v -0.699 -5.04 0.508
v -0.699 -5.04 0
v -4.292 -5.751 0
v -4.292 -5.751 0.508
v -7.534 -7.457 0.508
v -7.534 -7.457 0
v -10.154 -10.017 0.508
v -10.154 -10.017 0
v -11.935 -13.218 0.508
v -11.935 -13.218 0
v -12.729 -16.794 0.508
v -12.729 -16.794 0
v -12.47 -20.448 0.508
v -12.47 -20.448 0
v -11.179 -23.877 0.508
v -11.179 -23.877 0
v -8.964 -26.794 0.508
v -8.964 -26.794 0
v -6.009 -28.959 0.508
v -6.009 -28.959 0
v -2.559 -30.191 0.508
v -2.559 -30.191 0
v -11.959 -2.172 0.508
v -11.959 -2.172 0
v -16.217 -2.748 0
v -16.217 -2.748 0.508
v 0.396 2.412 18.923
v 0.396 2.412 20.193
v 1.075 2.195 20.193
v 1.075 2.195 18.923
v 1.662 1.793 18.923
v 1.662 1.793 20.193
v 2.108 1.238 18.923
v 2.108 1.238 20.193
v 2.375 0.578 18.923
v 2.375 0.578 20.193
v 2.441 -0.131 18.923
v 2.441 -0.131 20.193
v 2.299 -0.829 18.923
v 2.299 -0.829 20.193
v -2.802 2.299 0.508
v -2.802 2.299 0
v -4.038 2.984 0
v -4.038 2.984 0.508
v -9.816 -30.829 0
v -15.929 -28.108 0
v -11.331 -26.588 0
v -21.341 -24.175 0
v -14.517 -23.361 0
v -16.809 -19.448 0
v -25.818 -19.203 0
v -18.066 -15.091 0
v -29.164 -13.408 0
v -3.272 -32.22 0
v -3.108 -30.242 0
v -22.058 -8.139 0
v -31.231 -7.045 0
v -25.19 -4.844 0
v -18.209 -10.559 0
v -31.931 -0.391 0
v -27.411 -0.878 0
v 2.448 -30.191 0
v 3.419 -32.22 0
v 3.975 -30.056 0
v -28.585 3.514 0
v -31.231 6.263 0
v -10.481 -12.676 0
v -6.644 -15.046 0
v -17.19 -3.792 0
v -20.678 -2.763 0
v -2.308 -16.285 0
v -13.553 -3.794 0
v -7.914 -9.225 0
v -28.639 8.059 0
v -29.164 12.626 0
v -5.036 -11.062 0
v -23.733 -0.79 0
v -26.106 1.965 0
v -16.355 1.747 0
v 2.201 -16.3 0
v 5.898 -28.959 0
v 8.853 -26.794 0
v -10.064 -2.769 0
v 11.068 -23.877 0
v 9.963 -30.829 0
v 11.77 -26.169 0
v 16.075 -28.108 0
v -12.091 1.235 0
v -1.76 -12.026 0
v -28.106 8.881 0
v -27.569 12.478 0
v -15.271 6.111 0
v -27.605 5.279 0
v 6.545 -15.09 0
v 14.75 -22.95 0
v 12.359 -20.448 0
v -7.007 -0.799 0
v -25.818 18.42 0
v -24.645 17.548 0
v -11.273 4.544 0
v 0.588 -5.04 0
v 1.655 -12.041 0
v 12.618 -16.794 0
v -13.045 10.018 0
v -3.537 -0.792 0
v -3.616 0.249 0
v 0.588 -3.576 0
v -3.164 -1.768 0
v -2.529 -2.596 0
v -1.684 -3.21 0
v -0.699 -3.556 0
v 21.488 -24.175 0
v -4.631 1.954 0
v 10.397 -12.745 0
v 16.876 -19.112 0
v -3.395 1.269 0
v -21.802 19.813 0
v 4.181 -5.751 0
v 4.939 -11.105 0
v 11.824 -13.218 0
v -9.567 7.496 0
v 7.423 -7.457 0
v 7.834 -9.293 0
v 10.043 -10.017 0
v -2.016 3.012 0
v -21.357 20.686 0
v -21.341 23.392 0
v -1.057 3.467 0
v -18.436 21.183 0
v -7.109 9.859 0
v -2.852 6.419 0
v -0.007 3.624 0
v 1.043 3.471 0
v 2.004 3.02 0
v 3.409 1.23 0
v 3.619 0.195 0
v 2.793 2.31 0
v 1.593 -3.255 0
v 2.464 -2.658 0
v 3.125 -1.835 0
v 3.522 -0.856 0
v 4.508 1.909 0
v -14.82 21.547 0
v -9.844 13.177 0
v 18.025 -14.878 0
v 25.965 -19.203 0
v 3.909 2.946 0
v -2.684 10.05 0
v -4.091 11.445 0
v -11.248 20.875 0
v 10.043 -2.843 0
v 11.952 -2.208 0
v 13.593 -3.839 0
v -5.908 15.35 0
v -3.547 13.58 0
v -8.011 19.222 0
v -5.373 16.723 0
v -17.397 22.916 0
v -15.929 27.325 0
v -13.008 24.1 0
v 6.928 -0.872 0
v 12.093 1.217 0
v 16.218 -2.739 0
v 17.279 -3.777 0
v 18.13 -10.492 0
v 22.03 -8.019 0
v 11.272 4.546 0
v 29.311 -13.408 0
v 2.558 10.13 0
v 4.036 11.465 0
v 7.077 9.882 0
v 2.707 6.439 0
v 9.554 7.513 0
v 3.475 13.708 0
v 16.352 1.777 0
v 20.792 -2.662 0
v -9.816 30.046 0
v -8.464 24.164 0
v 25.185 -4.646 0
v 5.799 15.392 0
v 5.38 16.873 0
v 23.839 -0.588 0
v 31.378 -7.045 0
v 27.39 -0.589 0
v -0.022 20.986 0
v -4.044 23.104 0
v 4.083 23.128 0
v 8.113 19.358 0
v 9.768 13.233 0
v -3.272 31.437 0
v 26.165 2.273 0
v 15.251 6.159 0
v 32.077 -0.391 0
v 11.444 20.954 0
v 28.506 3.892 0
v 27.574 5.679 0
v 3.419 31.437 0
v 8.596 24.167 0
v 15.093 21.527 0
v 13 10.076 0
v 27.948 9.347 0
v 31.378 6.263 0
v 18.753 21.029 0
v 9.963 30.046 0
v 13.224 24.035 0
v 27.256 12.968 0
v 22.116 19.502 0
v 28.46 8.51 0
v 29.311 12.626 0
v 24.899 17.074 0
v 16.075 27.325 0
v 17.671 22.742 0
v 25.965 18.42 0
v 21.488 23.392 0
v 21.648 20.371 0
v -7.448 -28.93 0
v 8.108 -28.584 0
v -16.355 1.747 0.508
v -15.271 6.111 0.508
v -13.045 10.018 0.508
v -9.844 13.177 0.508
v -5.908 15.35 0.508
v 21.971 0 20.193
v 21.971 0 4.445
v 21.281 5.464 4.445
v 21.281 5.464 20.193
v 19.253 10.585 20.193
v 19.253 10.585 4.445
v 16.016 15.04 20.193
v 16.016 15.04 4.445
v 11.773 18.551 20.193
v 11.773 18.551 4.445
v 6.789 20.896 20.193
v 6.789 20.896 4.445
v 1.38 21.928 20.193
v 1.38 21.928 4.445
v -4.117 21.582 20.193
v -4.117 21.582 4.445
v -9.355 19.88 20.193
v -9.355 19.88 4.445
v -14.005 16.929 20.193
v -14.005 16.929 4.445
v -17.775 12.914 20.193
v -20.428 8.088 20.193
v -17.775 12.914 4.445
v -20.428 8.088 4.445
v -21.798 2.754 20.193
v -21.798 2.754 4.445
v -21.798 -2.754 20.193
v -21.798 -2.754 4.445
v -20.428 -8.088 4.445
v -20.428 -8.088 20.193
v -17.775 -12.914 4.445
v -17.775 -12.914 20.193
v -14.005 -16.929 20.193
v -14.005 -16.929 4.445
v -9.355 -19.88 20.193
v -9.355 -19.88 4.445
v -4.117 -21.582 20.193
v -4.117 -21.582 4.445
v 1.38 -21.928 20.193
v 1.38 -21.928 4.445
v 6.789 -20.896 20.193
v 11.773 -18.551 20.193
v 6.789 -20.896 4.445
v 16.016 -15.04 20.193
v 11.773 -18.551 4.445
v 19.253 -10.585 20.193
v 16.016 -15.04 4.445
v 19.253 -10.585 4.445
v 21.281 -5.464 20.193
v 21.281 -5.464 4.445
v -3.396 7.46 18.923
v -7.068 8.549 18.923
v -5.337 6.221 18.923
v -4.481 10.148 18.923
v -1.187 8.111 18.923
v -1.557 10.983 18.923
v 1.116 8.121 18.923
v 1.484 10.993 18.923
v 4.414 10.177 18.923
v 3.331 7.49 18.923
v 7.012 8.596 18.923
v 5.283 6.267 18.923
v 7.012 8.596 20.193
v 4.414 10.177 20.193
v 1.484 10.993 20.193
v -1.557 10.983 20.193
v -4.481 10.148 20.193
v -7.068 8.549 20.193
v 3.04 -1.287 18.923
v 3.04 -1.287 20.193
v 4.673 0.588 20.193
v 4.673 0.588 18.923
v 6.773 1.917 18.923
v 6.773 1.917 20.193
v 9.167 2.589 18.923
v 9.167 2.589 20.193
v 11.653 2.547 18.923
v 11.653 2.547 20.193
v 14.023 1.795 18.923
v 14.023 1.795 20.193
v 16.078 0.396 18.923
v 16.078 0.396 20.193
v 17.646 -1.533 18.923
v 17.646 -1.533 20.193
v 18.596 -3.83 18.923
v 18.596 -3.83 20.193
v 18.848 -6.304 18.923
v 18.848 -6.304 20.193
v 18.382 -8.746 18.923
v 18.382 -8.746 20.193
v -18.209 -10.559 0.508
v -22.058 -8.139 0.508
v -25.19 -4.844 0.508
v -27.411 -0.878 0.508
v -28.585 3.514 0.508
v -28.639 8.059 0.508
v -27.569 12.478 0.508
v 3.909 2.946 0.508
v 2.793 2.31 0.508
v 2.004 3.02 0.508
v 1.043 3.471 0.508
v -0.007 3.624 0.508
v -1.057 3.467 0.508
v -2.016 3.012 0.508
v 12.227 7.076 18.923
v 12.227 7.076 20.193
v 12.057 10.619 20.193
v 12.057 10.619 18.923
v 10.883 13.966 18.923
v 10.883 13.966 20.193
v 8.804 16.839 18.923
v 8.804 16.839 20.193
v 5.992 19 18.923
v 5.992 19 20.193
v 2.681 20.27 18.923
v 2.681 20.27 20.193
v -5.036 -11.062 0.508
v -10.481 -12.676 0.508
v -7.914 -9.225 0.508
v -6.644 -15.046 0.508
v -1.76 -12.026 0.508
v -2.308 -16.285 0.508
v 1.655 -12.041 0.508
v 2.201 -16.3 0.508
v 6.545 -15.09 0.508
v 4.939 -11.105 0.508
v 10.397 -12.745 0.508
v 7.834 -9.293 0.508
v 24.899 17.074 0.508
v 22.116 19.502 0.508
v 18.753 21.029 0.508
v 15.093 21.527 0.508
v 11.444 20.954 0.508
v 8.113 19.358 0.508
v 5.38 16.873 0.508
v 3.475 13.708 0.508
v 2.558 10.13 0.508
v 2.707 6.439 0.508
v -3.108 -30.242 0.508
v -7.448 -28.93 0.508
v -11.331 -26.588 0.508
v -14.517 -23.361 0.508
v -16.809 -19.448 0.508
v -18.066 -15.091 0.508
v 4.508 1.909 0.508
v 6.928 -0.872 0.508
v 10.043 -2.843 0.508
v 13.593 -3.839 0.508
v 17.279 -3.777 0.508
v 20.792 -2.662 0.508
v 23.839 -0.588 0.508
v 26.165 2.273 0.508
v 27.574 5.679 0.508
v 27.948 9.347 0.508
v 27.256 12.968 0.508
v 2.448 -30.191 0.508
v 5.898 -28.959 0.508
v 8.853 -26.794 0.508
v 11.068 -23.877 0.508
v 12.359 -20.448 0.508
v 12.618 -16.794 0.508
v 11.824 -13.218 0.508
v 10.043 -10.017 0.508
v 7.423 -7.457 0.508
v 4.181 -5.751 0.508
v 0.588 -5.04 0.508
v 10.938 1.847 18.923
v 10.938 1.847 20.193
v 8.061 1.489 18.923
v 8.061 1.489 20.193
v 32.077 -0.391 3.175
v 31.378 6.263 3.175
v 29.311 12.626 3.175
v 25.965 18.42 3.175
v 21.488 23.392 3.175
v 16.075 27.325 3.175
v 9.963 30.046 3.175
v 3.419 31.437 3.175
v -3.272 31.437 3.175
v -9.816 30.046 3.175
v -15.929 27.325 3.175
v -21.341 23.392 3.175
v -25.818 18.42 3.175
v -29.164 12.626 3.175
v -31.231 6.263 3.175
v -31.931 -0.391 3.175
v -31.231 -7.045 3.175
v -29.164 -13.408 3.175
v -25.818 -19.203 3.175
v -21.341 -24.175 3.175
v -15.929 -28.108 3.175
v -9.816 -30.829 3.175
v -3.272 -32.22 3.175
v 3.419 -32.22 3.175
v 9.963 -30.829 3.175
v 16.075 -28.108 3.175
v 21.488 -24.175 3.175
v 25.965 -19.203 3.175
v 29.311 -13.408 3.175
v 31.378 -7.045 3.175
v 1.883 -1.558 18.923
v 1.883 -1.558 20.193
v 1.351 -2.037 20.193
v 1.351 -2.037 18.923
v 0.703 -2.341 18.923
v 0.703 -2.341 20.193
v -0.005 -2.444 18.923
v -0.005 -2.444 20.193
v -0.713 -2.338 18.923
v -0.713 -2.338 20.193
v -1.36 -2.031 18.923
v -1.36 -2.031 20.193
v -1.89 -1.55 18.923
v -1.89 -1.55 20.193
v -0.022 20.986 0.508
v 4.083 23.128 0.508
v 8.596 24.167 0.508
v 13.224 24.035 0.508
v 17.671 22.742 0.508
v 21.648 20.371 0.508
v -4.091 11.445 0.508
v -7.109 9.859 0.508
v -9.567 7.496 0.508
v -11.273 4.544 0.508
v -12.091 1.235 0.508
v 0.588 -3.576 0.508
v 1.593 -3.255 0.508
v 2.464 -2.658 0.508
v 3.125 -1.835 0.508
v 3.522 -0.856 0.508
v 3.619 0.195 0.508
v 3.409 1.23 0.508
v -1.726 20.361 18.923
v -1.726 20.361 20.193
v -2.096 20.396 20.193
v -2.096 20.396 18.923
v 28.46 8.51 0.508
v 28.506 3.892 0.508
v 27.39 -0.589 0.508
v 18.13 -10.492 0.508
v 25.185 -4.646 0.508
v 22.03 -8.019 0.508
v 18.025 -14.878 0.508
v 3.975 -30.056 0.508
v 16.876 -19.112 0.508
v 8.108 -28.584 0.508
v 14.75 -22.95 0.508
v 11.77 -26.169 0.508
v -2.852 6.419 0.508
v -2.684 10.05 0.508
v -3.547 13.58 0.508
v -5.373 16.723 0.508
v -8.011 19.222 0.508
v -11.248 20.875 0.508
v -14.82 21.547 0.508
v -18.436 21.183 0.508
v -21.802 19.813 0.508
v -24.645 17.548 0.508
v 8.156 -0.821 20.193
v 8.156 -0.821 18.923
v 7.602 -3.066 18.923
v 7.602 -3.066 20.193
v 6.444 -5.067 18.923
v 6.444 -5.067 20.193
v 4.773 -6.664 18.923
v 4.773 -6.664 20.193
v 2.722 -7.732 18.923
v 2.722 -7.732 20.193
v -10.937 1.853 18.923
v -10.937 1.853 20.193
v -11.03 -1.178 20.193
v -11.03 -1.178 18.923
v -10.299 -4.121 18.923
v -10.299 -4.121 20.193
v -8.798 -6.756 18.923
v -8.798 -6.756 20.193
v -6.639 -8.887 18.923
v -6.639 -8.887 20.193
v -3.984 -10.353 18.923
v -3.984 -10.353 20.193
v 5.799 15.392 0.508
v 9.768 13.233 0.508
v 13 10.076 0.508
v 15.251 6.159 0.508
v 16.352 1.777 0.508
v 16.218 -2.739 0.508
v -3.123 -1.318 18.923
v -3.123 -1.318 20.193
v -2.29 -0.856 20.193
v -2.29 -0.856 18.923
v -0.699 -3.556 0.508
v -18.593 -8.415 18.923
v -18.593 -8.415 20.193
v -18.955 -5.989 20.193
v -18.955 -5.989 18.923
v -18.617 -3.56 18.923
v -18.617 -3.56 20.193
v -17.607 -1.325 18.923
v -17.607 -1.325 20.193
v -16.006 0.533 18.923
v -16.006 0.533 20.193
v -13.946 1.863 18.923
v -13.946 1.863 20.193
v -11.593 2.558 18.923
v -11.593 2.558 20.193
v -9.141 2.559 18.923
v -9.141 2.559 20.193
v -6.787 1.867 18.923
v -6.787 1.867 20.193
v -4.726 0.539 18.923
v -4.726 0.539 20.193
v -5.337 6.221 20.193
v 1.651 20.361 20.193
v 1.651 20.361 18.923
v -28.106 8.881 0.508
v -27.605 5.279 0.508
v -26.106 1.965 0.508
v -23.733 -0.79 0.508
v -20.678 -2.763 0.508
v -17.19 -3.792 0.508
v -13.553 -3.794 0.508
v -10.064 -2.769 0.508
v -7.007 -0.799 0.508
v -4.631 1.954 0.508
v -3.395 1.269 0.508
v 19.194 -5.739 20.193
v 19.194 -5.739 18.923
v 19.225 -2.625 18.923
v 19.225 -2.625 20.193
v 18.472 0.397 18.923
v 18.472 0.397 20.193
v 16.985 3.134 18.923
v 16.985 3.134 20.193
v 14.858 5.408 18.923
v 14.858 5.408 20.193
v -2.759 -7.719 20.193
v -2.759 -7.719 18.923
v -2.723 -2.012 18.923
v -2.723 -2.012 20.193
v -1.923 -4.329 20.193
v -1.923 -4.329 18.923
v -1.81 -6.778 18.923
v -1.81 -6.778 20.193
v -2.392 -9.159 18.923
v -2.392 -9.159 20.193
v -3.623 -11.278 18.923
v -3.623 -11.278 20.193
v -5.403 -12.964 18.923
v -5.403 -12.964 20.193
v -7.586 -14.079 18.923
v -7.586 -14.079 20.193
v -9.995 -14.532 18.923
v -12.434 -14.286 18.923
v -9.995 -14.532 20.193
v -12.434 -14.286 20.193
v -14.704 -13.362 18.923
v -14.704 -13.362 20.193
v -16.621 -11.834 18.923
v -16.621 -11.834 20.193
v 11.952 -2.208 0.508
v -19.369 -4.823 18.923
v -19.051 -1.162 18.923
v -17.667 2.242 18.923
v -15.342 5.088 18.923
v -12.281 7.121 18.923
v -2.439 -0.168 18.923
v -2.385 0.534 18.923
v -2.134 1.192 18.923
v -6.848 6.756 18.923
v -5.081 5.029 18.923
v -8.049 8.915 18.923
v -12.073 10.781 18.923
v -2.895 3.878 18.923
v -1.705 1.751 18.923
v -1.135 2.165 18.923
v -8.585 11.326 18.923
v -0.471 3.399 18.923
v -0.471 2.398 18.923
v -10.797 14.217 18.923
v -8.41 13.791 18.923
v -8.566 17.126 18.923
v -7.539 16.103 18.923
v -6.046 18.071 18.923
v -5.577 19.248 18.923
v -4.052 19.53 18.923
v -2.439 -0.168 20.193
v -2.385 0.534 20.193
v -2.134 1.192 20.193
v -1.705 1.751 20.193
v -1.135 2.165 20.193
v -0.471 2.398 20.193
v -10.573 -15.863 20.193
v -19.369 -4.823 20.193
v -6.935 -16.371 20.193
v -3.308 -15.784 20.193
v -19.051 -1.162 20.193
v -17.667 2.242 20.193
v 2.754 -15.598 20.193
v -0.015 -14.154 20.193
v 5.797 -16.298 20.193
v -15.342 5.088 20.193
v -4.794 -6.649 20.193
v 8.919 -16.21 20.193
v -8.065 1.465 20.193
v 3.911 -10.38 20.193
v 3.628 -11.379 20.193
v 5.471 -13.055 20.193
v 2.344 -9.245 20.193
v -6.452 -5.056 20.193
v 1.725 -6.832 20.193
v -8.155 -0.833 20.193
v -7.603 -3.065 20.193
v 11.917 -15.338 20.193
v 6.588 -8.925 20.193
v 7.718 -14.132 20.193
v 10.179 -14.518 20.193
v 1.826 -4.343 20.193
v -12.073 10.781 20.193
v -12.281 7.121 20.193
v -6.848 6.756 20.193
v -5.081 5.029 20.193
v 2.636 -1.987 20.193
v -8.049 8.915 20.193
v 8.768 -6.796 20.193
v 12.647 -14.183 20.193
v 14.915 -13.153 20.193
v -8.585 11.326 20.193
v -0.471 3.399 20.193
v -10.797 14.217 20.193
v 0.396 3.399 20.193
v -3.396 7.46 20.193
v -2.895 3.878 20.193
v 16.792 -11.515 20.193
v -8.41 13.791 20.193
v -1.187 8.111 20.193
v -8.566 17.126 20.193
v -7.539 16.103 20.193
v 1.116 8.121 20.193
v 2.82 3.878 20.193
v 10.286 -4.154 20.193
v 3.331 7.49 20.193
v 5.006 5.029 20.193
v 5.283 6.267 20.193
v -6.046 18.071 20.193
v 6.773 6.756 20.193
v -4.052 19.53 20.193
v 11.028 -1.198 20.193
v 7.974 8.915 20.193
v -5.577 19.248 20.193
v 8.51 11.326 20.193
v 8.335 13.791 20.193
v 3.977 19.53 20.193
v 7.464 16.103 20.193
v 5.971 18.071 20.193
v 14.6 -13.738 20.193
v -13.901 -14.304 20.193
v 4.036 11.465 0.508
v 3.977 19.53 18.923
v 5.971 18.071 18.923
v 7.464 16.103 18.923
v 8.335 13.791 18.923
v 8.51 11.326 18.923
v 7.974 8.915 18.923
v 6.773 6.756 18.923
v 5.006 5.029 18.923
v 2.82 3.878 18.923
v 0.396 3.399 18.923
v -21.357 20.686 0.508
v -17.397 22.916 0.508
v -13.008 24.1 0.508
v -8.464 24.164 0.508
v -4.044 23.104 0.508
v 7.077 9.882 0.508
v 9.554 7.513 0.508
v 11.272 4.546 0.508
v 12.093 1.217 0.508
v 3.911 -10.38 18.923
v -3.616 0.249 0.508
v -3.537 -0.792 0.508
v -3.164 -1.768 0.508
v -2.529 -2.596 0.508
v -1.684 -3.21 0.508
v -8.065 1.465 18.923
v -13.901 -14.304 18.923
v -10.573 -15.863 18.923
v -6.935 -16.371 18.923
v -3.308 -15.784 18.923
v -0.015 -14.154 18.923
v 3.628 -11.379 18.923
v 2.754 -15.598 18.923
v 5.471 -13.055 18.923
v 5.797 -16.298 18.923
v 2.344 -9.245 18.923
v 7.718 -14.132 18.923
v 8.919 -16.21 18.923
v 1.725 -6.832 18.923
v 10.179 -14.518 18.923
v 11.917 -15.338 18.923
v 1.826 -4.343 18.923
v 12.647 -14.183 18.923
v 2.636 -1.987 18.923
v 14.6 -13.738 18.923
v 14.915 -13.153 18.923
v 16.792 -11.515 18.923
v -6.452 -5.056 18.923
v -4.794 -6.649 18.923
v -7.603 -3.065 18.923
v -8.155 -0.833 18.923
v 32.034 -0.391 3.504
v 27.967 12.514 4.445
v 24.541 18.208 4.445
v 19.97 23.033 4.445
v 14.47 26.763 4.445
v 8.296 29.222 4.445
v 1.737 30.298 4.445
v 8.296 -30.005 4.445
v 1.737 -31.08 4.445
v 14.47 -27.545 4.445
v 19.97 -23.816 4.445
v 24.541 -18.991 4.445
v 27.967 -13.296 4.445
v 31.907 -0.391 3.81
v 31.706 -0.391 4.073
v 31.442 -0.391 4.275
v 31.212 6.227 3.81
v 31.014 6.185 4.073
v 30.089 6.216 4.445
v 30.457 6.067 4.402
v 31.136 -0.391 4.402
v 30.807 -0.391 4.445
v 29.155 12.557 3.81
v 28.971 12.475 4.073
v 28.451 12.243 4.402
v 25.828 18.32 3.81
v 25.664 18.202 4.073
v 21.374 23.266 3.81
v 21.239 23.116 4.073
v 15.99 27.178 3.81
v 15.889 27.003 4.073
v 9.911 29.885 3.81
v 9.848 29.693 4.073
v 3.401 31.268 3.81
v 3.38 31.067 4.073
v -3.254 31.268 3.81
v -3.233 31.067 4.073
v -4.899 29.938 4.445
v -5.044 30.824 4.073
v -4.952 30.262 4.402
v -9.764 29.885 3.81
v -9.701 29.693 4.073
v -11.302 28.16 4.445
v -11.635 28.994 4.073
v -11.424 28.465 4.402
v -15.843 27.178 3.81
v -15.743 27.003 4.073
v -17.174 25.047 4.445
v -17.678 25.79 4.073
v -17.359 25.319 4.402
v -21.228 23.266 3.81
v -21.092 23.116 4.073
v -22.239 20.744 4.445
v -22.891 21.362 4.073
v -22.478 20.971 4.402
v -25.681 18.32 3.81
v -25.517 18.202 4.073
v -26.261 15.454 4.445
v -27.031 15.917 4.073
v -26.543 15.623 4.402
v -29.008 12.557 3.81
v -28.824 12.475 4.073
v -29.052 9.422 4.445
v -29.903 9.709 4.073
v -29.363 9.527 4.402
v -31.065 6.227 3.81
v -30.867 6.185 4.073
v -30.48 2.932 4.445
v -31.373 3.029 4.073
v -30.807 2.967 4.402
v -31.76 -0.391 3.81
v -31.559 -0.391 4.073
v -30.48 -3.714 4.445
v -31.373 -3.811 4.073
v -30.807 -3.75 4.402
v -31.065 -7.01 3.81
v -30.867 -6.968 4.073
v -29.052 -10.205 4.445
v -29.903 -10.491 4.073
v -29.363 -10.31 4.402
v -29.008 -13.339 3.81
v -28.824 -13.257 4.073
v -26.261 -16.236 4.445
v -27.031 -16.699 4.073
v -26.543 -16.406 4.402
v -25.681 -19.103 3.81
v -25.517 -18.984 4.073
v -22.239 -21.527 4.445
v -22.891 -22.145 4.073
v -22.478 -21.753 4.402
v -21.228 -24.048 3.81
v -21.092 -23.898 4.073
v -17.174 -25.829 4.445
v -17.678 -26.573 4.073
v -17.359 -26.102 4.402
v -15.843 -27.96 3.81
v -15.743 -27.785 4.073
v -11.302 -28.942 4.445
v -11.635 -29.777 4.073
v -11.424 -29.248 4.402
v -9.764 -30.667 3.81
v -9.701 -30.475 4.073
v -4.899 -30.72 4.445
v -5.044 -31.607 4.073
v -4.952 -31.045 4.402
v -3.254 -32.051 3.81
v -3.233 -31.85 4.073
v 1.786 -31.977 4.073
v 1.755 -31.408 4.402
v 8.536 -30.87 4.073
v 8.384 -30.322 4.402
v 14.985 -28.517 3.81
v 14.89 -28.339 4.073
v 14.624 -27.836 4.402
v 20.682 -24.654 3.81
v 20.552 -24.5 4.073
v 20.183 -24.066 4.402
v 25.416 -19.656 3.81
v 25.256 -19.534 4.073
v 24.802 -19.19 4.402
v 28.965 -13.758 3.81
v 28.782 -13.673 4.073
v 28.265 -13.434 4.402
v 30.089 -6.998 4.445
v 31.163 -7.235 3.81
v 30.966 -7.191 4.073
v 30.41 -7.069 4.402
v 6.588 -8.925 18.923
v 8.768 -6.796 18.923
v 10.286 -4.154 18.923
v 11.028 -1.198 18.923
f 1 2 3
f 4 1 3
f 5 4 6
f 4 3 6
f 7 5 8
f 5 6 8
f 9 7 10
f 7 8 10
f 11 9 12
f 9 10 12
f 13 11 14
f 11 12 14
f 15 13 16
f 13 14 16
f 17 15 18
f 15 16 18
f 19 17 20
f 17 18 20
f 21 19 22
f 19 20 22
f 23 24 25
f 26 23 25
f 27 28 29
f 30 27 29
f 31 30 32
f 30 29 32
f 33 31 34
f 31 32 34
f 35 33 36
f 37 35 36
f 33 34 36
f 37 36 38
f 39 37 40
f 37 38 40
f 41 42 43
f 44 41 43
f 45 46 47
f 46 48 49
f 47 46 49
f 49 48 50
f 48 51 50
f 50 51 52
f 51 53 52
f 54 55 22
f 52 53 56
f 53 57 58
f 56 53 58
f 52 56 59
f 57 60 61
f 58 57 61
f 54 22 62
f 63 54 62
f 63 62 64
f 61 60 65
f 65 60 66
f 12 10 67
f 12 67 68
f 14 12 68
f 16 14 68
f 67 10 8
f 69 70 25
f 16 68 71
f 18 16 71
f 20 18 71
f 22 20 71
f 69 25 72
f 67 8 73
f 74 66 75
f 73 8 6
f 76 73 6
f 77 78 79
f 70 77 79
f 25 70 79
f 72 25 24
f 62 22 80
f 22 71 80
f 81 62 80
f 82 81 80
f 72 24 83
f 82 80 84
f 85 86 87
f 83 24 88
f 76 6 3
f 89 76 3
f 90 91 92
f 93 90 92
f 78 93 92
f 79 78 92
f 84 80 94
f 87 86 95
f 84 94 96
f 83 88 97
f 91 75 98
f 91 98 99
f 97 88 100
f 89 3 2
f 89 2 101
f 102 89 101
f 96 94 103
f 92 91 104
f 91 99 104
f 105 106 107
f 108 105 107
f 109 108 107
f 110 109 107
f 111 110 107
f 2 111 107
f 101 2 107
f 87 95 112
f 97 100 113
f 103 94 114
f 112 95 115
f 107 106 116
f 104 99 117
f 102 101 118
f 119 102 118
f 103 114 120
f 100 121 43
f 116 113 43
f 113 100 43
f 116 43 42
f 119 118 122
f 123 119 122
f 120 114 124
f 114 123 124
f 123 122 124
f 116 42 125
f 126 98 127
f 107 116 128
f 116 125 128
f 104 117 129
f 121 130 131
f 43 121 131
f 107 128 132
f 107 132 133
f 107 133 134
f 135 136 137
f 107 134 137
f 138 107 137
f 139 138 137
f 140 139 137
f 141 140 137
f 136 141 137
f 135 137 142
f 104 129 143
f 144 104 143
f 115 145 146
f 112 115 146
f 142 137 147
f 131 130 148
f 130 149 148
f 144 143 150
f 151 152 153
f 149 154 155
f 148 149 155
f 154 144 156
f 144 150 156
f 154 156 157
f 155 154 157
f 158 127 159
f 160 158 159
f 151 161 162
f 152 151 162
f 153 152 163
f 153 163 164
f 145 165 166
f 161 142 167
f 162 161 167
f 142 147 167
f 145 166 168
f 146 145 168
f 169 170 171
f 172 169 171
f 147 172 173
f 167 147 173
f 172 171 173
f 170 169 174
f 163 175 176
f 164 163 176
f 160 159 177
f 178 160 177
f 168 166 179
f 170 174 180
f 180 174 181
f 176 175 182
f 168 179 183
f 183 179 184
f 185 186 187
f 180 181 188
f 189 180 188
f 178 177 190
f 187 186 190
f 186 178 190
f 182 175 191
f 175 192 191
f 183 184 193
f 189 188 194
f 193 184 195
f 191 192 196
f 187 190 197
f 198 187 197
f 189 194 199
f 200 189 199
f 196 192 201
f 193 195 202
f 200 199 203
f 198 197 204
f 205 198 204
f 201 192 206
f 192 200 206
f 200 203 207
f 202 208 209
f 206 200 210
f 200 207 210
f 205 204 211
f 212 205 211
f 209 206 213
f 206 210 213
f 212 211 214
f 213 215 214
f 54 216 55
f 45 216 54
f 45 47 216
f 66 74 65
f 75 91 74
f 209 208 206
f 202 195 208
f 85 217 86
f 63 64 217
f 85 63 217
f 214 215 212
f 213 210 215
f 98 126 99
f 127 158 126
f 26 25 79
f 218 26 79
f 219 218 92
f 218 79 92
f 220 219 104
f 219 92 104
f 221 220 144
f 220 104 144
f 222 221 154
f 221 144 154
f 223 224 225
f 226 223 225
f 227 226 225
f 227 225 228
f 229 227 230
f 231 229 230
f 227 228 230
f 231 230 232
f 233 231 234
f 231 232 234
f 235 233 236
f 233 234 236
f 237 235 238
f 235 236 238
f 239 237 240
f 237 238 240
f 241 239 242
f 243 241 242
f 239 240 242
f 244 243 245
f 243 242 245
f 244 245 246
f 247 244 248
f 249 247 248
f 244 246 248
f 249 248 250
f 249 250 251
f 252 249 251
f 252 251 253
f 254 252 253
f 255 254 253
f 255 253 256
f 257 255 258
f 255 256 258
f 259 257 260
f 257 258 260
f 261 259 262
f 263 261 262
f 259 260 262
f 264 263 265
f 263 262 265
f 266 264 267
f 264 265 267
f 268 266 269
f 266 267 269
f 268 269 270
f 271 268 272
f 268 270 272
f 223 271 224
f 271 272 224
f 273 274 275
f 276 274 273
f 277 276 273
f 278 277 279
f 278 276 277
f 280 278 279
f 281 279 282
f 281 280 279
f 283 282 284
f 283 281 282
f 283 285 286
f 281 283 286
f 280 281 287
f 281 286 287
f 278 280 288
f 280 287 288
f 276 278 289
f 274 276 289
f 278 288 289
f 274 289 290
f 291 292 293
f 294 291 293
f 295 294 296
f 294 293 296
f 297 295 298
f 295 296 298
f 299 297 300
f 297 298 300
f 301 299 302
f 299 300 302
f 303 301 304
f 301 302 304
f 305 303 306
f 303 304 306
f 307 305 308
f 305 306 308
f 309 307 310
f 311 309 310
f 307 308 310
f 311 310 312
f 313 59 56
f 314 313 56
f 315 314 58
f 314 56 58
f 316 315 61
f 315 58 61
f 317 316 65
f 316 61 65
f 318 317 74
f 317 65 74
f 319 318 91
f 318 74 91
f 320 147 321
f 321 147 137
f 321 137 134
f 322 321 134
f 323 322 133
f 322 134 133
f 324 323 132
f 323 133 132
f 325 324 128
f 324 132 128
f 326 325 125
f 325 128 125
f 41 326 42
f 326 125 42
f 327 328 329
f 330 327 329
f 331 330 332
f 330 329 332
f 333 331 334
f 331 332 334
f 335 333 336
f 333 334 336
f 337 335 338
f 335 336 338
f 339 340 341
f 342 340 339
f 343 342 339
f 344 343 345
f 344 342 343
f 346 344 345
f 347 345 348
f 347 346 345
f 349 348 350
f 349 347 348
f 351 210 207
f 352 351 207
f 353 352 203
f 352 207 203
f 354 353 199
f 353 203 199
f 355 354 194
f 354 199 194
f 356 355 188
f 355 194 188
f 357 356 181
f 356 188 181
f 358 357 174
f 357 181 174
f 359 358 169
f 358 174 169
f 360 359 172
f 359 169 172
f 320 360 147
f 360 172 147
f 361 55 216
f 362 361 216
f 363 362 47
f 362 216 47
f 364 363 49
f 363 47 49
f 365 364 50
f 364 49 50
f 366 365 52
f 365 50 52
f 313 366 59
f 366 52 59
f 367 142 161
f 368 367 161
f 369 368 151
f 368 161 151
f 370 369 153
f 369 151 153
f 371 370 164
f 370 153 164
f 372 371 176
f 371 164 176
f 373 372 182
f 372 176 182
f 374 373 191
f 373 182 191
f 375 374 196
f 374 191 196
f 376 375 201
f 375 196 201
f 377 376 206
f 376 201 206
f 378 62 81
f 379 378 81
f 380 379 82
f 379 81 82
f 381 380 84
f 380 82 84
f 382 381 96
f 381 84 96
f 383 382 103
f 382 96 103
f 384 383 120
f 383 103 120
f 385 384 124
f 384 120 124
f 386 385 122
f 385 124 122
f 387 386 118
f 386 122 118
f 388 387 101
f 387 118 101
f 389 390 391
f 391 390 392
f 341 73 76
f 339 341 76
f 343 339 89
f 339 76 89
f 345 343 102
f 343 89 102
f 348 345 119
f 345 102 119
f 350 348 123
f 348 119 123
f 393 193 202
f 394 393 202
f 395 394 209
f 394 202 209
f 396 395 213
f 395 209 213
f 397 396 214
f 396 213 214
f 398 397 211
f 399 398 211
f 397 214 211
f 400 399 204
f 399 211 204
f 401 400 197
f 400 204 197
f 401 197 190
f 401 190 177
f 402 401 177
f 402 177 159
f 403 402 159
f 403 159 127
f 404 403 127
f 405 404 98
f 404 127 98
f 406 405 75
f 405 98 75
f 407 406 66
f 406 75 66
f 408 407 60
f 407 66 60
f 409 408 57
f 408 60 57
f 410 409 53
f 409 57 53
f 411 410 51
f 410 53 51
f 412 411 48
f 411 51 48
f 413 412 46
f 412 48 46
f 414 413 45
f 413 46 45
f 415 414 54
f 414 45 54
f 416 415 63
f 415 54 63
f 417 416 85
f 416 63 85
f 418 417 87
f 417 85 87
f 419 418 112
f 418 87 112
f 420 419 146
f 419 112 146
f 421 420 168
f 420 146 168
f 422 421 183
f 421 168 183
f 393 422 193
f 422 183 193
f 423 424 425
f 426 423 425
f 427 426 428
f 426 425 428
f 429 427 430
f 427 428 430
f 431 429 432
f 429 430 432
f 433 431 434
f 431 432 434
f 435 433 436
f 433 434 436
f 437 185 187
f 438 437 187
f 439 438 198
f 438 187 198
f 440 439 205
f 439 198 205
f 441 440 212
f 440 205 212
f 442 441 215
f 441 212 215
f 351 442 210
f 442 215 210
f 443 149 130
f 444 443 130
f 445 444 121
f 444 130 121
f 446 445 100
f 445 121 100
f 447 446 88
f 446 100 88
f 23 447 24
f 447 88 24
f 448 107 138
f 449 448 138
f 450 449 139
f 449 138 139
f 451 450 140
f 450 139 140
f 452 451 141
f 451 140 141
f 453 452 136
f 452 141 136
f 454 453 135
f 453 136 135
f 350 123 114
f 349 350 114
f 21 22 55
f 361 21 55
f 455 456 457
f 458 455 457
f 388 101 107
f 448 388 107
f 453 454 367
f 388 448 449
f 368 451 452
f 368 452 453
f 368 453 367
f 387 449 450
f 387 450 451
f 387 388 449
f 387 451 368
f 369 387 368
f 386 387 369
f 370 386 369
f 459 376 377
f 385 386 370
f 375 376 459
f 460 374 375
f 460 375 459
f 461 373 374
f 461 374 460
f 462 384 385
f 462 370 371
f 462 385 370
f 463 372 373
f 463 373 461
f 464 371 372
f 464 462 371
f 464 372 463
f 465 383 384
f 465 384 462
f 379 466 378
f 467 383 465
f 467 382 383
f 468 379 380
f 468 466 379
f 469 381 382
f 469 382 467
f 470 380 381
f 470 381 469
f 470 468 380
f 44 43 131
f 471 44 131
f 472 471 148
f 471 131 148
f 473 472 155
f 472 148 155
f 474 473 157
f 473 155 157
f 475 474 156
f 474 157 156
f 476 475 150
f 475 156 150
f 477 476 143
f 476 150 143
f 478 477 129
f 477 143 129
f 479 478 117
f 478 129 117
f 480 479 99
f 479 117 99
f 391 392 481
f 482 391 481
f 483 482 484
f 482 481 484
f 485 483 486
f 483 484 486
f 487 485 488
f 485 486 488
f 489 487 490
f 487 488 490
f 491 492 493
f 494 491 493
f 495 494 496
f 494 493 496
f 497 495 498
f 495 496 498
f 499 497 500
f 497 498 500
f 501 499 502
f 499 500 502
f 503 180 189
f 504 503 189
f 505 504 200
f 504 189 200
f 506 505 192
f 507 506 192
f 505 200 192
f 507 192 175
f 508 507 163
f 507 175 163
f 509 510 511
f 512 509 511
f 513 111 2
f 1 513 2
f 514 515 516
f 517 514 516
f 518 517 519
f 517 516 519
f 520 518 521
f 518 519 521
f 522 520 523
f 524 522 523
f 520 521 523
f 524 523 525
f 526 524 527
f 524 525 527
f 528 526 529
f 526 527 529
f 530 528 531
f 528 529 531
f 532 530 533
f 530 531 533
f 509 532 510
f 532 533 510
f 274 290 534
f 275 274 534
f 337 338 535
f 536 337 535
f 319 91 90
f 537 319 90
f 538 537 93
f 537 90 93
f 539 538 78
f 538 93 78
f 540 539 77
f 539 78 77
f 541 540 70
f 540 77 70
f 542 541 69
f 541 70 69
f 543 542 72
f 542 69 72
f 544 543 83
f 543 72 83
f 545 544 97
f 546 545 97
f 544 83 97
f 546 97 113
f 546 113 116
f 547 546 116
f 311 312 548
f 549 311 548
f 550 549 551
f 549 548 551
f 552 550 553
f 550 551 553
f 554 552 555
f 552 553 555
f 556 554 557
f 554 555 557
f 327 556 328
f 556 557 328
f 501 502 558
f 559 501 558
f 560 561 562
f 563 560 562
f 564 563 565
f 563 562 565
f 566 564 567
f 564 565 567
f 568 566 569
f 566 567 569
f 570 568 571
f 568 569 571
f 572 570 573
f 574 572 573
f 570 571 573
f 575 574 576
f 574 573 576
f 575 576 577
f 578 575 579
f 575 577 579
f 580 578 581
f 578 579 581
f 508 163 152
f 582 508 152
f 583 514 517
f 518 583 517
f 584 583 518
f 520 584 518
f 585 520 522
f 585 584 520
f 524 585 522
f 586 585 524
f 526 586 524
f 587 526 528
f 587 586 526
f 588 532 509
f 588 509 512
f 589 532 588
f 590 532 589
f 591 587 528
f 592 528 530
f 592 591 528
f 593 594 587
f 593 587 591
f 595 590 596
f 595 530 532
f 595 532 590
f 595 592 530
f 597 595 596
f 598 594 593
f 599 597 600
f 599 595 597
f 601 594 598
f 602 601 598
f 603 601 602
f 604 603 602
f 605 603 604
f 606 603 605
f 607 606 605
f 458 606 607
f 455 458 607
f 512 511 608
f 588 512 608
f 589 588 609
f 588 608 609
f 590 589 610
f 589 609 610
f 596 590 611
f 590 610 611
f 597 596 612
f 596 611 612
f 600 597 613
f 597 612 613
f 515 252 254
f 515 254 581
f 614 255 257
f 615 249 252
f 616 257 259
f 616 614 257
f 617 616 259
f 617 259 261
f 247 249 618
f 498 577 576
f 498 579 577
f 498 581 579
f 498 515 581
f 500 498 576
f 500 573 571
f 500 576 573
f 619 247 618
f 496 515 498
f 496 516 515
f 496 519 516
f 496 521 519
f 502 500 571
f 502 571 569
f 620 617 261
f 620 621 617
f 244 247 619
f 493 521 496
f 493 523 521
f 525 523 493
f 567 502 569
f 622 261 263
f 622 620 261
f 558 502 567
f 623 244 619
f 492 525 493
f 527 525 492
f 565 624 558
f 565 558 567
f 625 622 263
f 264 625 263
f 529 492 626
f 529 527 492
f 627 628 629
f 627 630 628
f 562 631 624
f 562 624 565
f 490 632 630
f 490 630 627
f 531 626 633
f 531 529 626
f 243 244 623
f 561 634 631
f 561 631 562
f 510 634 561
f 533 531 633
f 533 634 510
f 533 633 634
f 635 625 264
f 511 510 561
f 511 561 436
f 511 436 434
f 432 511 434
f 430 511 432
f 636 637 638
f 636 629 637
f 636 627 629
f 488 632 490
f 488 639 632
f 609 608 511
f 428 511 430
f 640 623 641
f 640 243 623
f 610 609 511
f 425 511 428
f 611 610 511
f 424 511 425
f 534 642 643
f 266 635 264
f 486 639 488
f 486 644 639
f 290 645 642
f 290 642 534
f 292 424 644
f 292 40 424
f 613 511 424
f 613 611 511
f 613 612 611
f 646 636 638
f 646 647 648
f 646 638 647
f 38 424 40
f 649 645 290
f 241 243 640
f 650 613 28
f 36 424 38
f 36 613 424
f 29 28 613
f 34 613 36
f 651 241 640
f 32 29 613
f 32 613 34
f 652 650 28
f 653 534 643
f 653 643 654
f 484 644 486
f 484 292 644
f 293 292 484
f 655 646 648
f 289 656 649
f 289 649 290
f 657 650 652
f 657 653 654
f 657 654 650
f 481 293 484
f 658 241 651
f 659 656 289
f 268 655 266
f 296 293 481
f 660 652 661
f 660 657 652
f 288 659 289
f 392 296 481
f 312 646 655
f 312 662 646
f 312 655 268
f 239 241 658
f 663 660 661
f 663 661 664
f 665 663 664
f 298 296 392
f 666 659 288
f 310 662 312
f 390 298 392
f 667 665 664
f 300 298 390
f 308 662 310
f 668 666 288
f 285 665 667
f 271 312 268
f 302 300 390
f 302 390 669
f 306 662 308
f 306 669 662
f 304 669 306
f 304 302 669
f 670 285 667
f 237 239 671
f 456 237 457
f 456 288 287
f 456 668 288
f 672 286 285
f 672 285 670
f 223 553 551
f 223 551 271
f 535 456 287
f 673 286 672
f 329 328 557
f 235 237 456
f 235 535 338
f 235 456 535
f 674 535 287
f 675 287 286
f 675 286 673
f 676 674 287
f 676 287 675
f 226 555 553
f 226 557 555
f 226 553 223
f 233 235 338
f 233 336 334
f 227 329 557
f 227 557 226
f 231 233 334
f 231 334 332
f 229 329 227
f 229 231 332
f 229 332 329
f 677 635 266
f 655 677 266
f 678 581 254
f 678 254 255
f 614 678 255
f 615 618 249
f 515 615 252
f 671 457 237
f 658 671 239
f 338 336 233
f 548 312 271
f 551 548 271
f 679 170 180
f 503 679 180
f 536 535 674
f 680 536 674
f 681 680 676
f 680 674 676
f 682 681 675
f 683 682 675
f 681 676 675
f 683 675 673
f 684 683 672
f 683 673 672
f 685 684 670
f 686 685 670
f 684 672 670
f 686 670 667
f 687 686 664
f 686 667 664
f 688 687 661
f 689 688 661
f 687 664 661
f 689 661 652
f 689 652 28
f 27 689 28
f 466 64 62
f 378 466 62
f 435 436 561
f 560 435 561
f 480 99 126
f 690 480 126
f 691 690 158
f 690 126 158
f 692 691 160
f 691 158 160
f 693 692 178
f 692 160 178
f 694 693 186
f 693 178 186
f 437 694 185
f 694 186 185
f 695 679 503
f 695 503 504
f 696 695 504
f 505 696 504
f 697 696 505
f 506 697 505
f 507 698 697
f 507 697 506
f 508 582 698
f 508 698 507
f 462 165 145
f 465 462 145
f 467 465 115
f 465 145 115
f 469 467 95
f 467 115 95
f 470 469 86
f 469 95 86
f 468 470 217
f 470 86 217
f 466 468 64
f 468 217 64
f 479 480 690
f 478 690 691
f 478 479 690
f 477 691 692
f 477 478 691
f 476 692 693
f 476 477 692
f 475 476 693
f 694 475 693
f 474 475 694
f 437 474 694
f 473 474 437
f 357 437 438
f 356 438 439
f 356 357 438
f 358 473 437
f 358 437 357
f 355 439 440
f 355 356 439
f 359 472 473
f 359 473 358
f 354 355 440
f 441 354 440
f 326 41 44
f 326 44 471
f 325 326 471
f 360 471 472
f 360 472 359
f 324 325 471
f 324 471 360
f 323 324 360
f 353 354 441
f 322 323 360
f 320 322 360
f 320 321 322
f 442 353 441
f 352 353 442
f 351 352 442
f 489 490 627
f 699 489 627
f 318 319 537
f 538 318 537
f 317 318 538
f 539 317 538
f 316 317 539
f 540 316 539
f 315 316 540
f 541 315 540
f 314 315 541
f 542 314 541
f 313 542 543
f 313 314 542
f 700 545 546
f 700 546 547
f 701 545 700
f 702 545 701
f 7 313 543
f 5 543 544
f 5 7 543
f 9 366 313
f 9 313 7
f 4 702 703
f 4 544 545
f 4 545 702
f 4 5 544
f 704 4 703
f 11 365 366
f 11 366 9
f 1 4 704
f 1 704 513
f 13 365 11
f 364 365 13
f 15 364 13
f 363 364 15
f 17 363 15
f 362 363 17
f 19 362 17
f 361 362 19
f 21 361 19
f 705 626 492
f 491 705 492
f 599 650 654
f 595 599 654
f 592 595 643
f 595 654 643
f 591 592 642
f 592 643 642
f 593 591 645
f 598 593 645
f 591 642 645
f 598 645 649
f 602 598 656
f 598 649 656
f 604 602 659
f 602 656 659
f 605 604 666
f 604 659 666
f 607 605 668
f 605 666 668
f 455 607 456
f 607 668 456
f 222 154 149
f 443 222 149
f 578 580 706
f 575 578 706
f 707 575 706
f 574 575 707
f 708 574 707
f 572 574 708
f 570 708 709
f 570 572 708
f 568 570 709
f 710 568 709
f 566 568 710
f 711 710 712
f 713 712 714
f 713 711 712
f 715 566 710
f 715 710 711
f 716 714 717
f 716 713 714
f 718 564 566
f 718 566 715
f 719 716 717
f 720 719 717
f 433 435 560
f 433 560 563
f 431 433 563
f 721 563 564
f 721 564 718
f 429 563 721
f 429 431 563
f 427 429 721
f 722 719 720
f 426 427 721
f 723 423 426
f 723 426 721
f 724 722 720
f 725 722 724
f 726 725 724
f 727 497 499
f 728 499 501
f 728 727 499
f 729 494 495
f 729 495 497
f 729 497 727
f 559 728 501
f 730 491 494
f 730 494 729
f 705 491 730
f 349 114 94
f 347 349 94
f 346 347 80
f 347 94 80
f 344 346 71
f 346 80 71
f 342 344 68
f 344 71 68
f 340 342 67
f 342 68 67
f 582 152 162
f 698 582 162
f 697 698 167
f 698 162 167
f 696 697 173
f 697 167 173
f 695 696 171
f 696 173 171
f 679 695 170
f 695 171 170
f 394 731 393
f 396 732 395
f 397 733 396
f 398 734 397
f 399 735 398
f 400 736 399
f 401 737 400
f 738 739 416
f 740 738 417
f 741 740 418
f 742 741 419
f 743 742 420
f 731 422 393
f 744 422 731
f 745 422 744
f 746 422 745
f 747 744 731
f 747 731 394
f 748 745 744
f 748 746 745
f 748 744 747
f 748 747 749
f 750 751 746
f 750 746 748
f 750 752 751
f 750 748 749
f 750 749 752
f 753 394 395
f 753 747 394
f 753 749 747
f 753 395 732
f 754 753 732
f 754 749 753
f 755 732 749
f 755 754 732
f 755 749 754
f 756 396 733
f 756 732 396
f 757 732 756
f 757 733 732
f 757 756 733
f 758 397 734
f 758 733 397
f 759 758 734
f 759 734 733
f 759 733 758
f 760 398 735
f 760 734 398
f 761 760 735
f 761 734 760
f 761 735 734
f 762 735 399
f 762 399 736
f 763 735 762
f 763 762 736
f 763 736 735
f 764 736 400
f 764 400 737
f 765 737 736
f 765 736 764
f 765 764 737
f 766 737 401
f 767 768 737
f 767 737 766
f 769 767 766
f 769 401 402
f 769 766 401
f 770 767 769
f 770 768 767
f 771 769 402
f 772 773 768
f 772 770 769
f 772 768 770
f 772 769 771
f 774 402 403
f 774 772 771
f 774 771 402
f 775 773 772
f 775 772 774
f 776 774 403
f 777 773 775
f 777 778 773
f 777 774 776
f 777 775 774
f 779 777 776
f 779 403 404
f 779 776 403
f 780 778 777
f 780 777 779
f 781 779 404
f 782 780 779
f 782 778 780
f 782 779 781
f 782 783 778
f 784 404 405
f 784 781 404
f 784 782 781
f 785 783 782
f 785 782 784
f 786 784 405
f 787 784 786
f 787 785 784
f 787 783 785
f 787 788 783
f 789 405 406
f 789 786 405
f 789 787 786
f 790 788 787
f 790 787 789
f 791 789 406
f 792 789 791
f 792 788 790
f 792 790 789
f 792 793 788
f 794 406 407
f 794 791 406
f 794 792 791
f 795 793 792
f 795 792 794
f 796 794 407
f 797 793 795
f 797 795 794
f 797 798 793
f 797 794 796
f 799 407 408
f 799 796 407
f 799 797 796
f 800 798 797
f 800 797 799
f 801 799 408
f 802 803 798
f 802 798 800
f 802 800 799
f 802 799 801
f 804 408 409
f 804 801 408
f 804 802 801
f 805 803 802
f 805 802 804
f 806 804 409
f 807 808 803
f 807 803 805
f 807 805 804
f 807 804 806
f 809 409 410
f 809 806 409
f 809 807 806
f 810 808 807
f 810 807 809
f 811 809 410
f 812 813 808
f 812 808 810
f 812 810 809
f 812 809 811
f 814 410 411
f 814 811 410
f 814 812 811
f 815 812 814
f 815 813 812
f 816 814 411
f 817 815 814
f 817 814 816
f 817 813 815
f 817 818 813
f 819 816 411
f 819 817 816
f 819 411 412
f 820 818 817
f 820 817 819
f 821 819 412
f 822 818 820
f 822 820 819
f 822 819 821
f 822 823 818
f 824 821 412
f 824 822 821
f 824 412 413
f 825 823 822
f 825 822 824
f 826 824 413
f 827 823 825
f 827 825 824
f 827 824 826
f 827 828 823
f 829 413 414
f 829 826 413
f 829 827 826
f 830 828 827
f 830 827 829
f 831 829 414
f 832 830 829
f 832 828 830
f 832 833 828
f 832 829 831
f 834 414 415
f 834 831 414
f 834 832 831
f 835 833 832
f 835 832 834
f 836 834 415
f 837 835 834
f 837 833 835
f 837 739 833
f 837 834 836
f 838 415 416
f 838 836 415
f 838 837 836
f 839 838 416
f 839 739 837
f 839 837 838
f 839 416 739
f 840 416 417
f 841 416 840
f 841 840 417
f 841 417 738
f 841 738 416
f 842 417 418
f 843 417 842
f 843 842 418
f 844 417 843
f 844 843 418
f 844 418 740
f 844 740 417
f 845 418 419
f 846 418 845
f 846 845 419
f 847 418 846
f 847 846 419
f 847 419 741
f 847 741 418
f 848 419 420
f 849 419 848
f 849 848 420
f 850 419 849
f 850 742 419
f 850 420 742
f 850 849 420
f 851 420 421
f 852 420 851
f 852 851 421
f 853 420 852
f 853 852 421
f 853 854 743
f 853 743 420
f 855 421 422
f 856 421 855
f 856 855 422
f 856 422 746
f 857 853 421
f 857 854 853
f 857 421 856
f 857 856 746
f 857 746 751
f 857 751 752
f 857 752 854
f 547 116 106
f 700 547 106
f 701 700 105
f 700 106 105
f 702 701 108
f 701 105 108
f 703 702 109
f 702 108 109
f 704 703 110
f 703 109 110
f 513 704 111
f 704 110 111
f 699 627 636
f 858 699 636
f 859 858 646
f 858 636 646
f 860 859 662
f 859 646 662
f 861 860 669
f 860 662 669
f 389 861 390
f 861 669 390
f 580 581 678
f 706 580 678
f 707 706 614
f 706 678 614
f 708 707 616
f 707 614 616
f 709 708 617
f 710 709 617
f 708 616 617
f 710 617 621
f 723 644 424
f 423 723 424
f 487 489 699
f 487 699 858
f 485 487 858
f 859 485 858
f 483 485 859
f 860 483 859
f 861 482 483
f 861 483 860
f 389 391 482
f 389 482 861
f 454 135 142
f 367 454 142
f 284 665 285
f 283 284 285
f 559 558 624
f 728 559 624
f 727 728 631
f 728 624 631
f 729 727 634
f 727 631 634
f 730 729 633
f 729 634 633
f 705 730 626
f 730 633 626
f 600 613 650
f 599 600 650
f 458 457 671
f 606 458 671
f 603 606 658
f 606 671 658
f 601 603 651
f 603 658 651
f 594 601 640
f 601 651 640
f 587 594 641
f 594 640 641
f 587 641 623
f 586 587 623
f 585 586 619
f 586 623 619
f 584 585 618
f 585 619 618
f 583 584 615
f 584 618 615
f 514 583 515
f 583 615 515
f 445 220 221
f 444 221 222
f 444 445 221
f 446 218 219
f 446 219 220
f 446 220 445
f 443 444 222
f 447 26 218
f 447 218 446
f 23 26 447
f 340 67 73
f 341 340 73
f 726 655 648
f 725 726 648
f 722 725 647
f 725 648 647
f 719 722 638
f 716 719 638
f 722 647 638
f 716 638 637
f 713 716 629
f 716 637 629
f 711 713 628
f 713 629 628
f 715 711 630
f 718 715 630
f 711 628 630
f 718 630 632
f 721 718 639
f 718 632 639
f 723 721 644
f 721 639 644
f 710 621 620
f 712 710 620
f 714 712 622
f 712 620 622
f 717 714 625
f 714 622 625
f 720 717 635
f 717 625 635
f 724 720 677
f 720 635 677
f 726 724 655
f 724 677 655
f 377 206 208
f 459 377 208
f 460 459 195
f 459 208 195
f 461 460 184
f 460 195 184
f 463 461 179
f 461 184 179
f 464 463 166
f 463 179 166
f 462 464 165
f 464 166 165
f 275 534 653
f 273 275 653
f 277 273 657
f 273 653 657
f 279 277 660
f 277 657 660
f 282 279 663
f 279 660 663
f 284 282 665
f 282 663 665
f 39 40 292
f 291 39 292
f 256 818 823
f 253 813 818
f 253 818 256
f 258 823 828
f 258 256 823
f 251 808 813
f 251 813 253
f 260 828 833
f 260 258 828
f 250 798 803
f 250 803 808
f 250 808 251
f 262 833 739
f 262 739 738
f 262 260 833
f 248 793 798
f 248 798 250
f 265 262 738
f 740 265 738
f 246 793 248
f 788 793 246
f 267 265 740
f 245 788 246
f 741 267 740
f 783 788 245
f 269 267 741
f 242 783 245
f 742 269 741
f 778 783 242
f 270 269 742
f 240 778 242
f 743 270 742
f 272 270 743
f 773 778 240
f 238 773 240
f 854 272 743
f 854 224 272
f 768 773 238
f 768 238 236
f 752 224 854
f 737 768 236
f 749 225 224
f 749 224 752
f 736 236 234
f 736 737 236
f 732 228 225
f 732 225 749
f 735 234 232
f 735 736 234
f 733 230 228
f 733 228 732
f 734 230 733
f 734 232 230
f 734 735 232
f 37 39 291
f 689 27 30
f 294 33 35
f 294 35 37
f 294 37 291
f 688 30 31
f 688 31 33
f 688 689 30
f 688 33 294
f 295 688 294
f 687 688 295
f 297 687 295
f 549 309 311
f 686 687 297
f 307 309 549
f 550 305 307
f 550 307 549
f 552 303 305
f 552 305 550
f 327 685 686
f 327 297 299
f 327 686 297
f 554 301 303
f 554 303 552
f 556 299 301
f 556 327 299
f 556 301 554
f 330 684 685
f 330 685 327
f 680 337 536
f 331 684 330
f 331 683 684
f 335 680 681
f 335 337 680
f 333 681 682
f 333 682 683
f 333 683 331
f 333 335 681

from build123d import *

# Parameters (mm, degrees)
F0_R     = 32.004
F1_DEPTH = 4.445
F2_R     = 21.971
F3_DEPTH = 15.748
F4_R     = 1.27
F6_DEPTH = 1.27
F8_DEPTH = 0.508


with BuildPart() as f1:
    # F0 (on Top) → F1 (new body)
    with BuildSketch(Plane.XY):
        with Locations((0.073482, -0.391256)):
            Circle(F0_R)
    extrude(amount=F1_DEPTH)

    # F2 (on face) → F3 (join)
    with BuildSketch(Plane.XY.offset(4.445)):
        Circle(F2_R)
    extrude(amount=F3_DEPTH)

    # F4
    f4_edges = [f1.edges().sort_by_distance(p)[0] for p in [
        (-31.930518, -0.391256, 4.445),
    ]]
    fillet(f4_edges, radius=F4_R)

    # F5 (on face) → F6 (cut)
    with BuildSketch(Plane.XY.offset(20.193)):
        with BuildLine():
            ThreePointArc((-2.289526, -0.856082), (-2.13389, 1.192192), (-0.471214, 2.398492))
            Line((-0.471214, 2.398492), (-0.471214, 3.399117))
            ThreePointArc((-0.471214, 3.399117), (-8.584584, 11.326412), (-1.725764, 20.361088))
            Line((-1.725764, 20.361088), (-2.096043, 20.395772))
            ThreePointArc((-2.096043, 20.395772), (-9.790587, 15.754955), (-12.280816, 7.121187))
            ThreePointArc((-12.280816, 7.121187), (-18.486635, 0.592049), (-18.592949, -8.415199))
            ThreePointArc((-18.592949, -8.415199), (-13.945533, 1.863373), (-3.122954, -1.317712))
            Line((-3.122954, -1.317712), (-2.289526, -0.856082))
        make_face()
        with BuildLine():
            ThreePointArc((7.011916, 8.595588), (-0.036517, 11.09278), (-7.068357, 8.549237))
            Line((-7.068357, 8.549237), (-5.337452, 6.221216))
            ThreePointArc((-5.337452, 6.221216), (-0.035687, 8.19699), (5.28308, 6.267454))
            Line((5.28308, 6.267454), (7.011916, 8.595588))
        make_face()
        with BuildLine():
            ThreePointArc((1.650786, 20.361088), (8.509606, 11.326412), (0.396236, 3.399117))
            Line((0.396236, 3.399117), (0.396236, 2.412013))
            ThreePointArc((0.396236, 2.412013), (2.107861, 1.237631), (2.299367, -0.829289))
            Line((2.299367, -0.829289), (3.040317, -1.287494))
            ThreePointArc((3.040317, -1.287494), (14.022686, 1.79542), (18.381804, -8.745684))
            ThreePointArc((18.381804, -8.745684), (18.472465, 0.397456), (12.227162, 7.075887))
            ThreePointArc((12.227162, 7.075887), (9.947927, 15.477573), (2.680689, 20.270328))
            Line((2.680689, 20.270328), (1.650786, 20.361088))
        make_face()
        with BuildLine():
            Line((10.93796, 1.8472), (8.060673, 1.489116))
            ThreePointArc((8.060673, 1.489116), (7.093825, -4.107257), (2.721723, -7.73202))
            Line((2.721723, -7.73202), (3.911208, -10.380441))
            ThreePointArc((3.911208, -10.380441), (9.617861, -5.527012), (10.93796, 1.8472))
        make_face()
        with BuildLine():
            ThreePointArc((16.792496, -11.514988), (5.471344, -13.055159), (2.636123, -1.987091))
            Line((2.636123, -1.987091), (1.883489, -1.557972))
            ThreePointArc((1.883489, -1.557972), (-0.004876, -2.444337), (-1.889689, -1.550446))
            Line((-1.889689, -1.550446), (-2.723258, -2.012154))
            ThreePointArc((-2.723258, -2.012154), (-5.402938, -12.96385), (-16.620994, -11.834447))
            ThreePointArc((-16.620994, -11.834447), (-8.773086, -16.253179), (-0.014838, -14.153672))
            ThreePointArc((-0.014838, -14.153672), (8.918758, -16.209761), (16.792496, -11.514988))
        make_face()
        with BuildLine():
            Line((-8.065113, 1.464878), (-10.936939, 1.853233))
            ThreePointArc((-10.936939, 1.853233), (-9.638834, -5.490353), (-3.984428, -10.352557))
            Line((-3.984428, -10.352557), (-2.759033, -7.718786))
            ThreePointArc((-2.759033, -7.718786), (-7.097567, -4.100788), (-8.065113, 1.464878))
        make_face()
    extrude(amount=-F6_DEPTH, mode=Mode.SUBTRACT)

    # F7 (on face) → F8 (cut)
    with BuildSketch(Plane(origin=(0, 0, 0), x_dir=(1, 0, 0), z_dir=(0, 0, -1))):
        with BuildLine():
            ThreePointArc((-3.394815, -1.269363), (-3.164044, 1.767733), (-0.698697, 3.556385))
            Line((-0.698697, 3.556385), (-0.698697, 5.04007))
            ThreePointArc((-0.698697, 5.04007), (-12.728867, 16.794335), (-2.558892, 30.190579))
            Line((-2.558892, 30.190579), (-3.107926, 30.242007))
            ThreePointArc((-3.107926, 30.242007), (-14.517077, 23.360795), (-18.209486, 10.559001))
            ThreePointArc((-18.209486, 10.559001), (-27.411217, 0.877866), (-27.568855, -12.477709))
            ThreePointArc((-27.568855, -12.477709), (-20.677859, 2.762933), (-4.630586, -1.953849))
            Line((-4.630586, -1.953849), (-3.394815, -1.269363))
        make_face()
        with BuildLine():
            ThreePointArc((10.396979, 12.745183), (-0.054146, 16.447916), (-10.480667, 12.676454))
            Line((-10.480667, 12.676454), (-7.914152, 9.224561))
            ThreePointArc((-7.914152, 9.224561), (-0.052915, 12.154157), (7.833533, 9.293121))
            Line((7.833533, 9.293121), (10.396979, 12.745183))
        make_face()
        with BuildLine():
            ThreePointArc((2.447718, 30.190579), (12.617692, 16.794335), (0.587522, 5.04007))
            Line((0.587522, 5.04007), (0.587522, 3.576432))
            ThreePointArc((0.587522, 3.576432), (3.125449, 1.835108), (3.409406, -1.229636))
            Line((3.409406, -1.229636), (4.508056, -1.909044))
            ThreePointArc((4.508056, -1.909044), (20.792258, 2.662175), (27.255778, -12.967738))
            ThreePointArc((27.255778, -12.967738), (27.390206, 0.589332), (18.129931, 10.491833))
            ThreePointArc((18.129931, 10.491833), (14.750374, 22.949505), (3.974815, 30.056004))
            Line((3.974815, 30.056004), (2.447718, 30.190579))
        make_face()
        with BuildLine():
            Line((16.218354, 2.738951), (11.952032, 2.208))
            ThreePointArc((11.952032, 2.208), (10.51843, -6.090071), (4.035658, -11.46472))
            Line((4.035658, -11.46472), (5.799377, -15.391689))
            ThreePointArc((5.799377, -15.391689), (14.260966, -8.195225), (16.218354, 2.738951))
        make_face()
        with BuildLine():
            ThreePointArc((24.899218, -17.073947), (8.112683, -19.35765), (3.908734, -2.946376))
            Line((3.908734, -2.946376), (2.79276, -2.310096))
            ThreePointArc((2.79276, -2.310096), (-0.007229, -3.624362), (-2.801953, -2.298937))
            Line((-2.801953, -2.298937), (-4.037934, -2.983539))
            ThreePointArc((-4.037934, -2.983539), (-8.011253, -19.222261), (-24.644922, -17.547628))
            ThreePointArc((-24.644922, -17.547628), (-13.008369, -24.099542), (-0.022, -20.986479))
            ThreePointArc((-0.022, -20.986479), (13.224366, -24.035163), (24.899218, -17.073947))
        make_face()
        with BuildLine():
            Line((-11.958616, 2.17206), (-16.216841, 2.747898))
            ThreePointArc((-16.216841, 2.747898), (-14.292065, -8.140869), (-5.907945, -15.350344))
            Line((-5.907945, -15.350344), (-4.09098, -11.445096))
            ThreePointArc((-4.09098, -11.445096), (-10.523978, -6.080479), (-11.958616, 2.17206))
        make_face()
    extrude(amount=-F8_DEPTH, mode=Mode.SUBTRACT)


solid = f1.part
